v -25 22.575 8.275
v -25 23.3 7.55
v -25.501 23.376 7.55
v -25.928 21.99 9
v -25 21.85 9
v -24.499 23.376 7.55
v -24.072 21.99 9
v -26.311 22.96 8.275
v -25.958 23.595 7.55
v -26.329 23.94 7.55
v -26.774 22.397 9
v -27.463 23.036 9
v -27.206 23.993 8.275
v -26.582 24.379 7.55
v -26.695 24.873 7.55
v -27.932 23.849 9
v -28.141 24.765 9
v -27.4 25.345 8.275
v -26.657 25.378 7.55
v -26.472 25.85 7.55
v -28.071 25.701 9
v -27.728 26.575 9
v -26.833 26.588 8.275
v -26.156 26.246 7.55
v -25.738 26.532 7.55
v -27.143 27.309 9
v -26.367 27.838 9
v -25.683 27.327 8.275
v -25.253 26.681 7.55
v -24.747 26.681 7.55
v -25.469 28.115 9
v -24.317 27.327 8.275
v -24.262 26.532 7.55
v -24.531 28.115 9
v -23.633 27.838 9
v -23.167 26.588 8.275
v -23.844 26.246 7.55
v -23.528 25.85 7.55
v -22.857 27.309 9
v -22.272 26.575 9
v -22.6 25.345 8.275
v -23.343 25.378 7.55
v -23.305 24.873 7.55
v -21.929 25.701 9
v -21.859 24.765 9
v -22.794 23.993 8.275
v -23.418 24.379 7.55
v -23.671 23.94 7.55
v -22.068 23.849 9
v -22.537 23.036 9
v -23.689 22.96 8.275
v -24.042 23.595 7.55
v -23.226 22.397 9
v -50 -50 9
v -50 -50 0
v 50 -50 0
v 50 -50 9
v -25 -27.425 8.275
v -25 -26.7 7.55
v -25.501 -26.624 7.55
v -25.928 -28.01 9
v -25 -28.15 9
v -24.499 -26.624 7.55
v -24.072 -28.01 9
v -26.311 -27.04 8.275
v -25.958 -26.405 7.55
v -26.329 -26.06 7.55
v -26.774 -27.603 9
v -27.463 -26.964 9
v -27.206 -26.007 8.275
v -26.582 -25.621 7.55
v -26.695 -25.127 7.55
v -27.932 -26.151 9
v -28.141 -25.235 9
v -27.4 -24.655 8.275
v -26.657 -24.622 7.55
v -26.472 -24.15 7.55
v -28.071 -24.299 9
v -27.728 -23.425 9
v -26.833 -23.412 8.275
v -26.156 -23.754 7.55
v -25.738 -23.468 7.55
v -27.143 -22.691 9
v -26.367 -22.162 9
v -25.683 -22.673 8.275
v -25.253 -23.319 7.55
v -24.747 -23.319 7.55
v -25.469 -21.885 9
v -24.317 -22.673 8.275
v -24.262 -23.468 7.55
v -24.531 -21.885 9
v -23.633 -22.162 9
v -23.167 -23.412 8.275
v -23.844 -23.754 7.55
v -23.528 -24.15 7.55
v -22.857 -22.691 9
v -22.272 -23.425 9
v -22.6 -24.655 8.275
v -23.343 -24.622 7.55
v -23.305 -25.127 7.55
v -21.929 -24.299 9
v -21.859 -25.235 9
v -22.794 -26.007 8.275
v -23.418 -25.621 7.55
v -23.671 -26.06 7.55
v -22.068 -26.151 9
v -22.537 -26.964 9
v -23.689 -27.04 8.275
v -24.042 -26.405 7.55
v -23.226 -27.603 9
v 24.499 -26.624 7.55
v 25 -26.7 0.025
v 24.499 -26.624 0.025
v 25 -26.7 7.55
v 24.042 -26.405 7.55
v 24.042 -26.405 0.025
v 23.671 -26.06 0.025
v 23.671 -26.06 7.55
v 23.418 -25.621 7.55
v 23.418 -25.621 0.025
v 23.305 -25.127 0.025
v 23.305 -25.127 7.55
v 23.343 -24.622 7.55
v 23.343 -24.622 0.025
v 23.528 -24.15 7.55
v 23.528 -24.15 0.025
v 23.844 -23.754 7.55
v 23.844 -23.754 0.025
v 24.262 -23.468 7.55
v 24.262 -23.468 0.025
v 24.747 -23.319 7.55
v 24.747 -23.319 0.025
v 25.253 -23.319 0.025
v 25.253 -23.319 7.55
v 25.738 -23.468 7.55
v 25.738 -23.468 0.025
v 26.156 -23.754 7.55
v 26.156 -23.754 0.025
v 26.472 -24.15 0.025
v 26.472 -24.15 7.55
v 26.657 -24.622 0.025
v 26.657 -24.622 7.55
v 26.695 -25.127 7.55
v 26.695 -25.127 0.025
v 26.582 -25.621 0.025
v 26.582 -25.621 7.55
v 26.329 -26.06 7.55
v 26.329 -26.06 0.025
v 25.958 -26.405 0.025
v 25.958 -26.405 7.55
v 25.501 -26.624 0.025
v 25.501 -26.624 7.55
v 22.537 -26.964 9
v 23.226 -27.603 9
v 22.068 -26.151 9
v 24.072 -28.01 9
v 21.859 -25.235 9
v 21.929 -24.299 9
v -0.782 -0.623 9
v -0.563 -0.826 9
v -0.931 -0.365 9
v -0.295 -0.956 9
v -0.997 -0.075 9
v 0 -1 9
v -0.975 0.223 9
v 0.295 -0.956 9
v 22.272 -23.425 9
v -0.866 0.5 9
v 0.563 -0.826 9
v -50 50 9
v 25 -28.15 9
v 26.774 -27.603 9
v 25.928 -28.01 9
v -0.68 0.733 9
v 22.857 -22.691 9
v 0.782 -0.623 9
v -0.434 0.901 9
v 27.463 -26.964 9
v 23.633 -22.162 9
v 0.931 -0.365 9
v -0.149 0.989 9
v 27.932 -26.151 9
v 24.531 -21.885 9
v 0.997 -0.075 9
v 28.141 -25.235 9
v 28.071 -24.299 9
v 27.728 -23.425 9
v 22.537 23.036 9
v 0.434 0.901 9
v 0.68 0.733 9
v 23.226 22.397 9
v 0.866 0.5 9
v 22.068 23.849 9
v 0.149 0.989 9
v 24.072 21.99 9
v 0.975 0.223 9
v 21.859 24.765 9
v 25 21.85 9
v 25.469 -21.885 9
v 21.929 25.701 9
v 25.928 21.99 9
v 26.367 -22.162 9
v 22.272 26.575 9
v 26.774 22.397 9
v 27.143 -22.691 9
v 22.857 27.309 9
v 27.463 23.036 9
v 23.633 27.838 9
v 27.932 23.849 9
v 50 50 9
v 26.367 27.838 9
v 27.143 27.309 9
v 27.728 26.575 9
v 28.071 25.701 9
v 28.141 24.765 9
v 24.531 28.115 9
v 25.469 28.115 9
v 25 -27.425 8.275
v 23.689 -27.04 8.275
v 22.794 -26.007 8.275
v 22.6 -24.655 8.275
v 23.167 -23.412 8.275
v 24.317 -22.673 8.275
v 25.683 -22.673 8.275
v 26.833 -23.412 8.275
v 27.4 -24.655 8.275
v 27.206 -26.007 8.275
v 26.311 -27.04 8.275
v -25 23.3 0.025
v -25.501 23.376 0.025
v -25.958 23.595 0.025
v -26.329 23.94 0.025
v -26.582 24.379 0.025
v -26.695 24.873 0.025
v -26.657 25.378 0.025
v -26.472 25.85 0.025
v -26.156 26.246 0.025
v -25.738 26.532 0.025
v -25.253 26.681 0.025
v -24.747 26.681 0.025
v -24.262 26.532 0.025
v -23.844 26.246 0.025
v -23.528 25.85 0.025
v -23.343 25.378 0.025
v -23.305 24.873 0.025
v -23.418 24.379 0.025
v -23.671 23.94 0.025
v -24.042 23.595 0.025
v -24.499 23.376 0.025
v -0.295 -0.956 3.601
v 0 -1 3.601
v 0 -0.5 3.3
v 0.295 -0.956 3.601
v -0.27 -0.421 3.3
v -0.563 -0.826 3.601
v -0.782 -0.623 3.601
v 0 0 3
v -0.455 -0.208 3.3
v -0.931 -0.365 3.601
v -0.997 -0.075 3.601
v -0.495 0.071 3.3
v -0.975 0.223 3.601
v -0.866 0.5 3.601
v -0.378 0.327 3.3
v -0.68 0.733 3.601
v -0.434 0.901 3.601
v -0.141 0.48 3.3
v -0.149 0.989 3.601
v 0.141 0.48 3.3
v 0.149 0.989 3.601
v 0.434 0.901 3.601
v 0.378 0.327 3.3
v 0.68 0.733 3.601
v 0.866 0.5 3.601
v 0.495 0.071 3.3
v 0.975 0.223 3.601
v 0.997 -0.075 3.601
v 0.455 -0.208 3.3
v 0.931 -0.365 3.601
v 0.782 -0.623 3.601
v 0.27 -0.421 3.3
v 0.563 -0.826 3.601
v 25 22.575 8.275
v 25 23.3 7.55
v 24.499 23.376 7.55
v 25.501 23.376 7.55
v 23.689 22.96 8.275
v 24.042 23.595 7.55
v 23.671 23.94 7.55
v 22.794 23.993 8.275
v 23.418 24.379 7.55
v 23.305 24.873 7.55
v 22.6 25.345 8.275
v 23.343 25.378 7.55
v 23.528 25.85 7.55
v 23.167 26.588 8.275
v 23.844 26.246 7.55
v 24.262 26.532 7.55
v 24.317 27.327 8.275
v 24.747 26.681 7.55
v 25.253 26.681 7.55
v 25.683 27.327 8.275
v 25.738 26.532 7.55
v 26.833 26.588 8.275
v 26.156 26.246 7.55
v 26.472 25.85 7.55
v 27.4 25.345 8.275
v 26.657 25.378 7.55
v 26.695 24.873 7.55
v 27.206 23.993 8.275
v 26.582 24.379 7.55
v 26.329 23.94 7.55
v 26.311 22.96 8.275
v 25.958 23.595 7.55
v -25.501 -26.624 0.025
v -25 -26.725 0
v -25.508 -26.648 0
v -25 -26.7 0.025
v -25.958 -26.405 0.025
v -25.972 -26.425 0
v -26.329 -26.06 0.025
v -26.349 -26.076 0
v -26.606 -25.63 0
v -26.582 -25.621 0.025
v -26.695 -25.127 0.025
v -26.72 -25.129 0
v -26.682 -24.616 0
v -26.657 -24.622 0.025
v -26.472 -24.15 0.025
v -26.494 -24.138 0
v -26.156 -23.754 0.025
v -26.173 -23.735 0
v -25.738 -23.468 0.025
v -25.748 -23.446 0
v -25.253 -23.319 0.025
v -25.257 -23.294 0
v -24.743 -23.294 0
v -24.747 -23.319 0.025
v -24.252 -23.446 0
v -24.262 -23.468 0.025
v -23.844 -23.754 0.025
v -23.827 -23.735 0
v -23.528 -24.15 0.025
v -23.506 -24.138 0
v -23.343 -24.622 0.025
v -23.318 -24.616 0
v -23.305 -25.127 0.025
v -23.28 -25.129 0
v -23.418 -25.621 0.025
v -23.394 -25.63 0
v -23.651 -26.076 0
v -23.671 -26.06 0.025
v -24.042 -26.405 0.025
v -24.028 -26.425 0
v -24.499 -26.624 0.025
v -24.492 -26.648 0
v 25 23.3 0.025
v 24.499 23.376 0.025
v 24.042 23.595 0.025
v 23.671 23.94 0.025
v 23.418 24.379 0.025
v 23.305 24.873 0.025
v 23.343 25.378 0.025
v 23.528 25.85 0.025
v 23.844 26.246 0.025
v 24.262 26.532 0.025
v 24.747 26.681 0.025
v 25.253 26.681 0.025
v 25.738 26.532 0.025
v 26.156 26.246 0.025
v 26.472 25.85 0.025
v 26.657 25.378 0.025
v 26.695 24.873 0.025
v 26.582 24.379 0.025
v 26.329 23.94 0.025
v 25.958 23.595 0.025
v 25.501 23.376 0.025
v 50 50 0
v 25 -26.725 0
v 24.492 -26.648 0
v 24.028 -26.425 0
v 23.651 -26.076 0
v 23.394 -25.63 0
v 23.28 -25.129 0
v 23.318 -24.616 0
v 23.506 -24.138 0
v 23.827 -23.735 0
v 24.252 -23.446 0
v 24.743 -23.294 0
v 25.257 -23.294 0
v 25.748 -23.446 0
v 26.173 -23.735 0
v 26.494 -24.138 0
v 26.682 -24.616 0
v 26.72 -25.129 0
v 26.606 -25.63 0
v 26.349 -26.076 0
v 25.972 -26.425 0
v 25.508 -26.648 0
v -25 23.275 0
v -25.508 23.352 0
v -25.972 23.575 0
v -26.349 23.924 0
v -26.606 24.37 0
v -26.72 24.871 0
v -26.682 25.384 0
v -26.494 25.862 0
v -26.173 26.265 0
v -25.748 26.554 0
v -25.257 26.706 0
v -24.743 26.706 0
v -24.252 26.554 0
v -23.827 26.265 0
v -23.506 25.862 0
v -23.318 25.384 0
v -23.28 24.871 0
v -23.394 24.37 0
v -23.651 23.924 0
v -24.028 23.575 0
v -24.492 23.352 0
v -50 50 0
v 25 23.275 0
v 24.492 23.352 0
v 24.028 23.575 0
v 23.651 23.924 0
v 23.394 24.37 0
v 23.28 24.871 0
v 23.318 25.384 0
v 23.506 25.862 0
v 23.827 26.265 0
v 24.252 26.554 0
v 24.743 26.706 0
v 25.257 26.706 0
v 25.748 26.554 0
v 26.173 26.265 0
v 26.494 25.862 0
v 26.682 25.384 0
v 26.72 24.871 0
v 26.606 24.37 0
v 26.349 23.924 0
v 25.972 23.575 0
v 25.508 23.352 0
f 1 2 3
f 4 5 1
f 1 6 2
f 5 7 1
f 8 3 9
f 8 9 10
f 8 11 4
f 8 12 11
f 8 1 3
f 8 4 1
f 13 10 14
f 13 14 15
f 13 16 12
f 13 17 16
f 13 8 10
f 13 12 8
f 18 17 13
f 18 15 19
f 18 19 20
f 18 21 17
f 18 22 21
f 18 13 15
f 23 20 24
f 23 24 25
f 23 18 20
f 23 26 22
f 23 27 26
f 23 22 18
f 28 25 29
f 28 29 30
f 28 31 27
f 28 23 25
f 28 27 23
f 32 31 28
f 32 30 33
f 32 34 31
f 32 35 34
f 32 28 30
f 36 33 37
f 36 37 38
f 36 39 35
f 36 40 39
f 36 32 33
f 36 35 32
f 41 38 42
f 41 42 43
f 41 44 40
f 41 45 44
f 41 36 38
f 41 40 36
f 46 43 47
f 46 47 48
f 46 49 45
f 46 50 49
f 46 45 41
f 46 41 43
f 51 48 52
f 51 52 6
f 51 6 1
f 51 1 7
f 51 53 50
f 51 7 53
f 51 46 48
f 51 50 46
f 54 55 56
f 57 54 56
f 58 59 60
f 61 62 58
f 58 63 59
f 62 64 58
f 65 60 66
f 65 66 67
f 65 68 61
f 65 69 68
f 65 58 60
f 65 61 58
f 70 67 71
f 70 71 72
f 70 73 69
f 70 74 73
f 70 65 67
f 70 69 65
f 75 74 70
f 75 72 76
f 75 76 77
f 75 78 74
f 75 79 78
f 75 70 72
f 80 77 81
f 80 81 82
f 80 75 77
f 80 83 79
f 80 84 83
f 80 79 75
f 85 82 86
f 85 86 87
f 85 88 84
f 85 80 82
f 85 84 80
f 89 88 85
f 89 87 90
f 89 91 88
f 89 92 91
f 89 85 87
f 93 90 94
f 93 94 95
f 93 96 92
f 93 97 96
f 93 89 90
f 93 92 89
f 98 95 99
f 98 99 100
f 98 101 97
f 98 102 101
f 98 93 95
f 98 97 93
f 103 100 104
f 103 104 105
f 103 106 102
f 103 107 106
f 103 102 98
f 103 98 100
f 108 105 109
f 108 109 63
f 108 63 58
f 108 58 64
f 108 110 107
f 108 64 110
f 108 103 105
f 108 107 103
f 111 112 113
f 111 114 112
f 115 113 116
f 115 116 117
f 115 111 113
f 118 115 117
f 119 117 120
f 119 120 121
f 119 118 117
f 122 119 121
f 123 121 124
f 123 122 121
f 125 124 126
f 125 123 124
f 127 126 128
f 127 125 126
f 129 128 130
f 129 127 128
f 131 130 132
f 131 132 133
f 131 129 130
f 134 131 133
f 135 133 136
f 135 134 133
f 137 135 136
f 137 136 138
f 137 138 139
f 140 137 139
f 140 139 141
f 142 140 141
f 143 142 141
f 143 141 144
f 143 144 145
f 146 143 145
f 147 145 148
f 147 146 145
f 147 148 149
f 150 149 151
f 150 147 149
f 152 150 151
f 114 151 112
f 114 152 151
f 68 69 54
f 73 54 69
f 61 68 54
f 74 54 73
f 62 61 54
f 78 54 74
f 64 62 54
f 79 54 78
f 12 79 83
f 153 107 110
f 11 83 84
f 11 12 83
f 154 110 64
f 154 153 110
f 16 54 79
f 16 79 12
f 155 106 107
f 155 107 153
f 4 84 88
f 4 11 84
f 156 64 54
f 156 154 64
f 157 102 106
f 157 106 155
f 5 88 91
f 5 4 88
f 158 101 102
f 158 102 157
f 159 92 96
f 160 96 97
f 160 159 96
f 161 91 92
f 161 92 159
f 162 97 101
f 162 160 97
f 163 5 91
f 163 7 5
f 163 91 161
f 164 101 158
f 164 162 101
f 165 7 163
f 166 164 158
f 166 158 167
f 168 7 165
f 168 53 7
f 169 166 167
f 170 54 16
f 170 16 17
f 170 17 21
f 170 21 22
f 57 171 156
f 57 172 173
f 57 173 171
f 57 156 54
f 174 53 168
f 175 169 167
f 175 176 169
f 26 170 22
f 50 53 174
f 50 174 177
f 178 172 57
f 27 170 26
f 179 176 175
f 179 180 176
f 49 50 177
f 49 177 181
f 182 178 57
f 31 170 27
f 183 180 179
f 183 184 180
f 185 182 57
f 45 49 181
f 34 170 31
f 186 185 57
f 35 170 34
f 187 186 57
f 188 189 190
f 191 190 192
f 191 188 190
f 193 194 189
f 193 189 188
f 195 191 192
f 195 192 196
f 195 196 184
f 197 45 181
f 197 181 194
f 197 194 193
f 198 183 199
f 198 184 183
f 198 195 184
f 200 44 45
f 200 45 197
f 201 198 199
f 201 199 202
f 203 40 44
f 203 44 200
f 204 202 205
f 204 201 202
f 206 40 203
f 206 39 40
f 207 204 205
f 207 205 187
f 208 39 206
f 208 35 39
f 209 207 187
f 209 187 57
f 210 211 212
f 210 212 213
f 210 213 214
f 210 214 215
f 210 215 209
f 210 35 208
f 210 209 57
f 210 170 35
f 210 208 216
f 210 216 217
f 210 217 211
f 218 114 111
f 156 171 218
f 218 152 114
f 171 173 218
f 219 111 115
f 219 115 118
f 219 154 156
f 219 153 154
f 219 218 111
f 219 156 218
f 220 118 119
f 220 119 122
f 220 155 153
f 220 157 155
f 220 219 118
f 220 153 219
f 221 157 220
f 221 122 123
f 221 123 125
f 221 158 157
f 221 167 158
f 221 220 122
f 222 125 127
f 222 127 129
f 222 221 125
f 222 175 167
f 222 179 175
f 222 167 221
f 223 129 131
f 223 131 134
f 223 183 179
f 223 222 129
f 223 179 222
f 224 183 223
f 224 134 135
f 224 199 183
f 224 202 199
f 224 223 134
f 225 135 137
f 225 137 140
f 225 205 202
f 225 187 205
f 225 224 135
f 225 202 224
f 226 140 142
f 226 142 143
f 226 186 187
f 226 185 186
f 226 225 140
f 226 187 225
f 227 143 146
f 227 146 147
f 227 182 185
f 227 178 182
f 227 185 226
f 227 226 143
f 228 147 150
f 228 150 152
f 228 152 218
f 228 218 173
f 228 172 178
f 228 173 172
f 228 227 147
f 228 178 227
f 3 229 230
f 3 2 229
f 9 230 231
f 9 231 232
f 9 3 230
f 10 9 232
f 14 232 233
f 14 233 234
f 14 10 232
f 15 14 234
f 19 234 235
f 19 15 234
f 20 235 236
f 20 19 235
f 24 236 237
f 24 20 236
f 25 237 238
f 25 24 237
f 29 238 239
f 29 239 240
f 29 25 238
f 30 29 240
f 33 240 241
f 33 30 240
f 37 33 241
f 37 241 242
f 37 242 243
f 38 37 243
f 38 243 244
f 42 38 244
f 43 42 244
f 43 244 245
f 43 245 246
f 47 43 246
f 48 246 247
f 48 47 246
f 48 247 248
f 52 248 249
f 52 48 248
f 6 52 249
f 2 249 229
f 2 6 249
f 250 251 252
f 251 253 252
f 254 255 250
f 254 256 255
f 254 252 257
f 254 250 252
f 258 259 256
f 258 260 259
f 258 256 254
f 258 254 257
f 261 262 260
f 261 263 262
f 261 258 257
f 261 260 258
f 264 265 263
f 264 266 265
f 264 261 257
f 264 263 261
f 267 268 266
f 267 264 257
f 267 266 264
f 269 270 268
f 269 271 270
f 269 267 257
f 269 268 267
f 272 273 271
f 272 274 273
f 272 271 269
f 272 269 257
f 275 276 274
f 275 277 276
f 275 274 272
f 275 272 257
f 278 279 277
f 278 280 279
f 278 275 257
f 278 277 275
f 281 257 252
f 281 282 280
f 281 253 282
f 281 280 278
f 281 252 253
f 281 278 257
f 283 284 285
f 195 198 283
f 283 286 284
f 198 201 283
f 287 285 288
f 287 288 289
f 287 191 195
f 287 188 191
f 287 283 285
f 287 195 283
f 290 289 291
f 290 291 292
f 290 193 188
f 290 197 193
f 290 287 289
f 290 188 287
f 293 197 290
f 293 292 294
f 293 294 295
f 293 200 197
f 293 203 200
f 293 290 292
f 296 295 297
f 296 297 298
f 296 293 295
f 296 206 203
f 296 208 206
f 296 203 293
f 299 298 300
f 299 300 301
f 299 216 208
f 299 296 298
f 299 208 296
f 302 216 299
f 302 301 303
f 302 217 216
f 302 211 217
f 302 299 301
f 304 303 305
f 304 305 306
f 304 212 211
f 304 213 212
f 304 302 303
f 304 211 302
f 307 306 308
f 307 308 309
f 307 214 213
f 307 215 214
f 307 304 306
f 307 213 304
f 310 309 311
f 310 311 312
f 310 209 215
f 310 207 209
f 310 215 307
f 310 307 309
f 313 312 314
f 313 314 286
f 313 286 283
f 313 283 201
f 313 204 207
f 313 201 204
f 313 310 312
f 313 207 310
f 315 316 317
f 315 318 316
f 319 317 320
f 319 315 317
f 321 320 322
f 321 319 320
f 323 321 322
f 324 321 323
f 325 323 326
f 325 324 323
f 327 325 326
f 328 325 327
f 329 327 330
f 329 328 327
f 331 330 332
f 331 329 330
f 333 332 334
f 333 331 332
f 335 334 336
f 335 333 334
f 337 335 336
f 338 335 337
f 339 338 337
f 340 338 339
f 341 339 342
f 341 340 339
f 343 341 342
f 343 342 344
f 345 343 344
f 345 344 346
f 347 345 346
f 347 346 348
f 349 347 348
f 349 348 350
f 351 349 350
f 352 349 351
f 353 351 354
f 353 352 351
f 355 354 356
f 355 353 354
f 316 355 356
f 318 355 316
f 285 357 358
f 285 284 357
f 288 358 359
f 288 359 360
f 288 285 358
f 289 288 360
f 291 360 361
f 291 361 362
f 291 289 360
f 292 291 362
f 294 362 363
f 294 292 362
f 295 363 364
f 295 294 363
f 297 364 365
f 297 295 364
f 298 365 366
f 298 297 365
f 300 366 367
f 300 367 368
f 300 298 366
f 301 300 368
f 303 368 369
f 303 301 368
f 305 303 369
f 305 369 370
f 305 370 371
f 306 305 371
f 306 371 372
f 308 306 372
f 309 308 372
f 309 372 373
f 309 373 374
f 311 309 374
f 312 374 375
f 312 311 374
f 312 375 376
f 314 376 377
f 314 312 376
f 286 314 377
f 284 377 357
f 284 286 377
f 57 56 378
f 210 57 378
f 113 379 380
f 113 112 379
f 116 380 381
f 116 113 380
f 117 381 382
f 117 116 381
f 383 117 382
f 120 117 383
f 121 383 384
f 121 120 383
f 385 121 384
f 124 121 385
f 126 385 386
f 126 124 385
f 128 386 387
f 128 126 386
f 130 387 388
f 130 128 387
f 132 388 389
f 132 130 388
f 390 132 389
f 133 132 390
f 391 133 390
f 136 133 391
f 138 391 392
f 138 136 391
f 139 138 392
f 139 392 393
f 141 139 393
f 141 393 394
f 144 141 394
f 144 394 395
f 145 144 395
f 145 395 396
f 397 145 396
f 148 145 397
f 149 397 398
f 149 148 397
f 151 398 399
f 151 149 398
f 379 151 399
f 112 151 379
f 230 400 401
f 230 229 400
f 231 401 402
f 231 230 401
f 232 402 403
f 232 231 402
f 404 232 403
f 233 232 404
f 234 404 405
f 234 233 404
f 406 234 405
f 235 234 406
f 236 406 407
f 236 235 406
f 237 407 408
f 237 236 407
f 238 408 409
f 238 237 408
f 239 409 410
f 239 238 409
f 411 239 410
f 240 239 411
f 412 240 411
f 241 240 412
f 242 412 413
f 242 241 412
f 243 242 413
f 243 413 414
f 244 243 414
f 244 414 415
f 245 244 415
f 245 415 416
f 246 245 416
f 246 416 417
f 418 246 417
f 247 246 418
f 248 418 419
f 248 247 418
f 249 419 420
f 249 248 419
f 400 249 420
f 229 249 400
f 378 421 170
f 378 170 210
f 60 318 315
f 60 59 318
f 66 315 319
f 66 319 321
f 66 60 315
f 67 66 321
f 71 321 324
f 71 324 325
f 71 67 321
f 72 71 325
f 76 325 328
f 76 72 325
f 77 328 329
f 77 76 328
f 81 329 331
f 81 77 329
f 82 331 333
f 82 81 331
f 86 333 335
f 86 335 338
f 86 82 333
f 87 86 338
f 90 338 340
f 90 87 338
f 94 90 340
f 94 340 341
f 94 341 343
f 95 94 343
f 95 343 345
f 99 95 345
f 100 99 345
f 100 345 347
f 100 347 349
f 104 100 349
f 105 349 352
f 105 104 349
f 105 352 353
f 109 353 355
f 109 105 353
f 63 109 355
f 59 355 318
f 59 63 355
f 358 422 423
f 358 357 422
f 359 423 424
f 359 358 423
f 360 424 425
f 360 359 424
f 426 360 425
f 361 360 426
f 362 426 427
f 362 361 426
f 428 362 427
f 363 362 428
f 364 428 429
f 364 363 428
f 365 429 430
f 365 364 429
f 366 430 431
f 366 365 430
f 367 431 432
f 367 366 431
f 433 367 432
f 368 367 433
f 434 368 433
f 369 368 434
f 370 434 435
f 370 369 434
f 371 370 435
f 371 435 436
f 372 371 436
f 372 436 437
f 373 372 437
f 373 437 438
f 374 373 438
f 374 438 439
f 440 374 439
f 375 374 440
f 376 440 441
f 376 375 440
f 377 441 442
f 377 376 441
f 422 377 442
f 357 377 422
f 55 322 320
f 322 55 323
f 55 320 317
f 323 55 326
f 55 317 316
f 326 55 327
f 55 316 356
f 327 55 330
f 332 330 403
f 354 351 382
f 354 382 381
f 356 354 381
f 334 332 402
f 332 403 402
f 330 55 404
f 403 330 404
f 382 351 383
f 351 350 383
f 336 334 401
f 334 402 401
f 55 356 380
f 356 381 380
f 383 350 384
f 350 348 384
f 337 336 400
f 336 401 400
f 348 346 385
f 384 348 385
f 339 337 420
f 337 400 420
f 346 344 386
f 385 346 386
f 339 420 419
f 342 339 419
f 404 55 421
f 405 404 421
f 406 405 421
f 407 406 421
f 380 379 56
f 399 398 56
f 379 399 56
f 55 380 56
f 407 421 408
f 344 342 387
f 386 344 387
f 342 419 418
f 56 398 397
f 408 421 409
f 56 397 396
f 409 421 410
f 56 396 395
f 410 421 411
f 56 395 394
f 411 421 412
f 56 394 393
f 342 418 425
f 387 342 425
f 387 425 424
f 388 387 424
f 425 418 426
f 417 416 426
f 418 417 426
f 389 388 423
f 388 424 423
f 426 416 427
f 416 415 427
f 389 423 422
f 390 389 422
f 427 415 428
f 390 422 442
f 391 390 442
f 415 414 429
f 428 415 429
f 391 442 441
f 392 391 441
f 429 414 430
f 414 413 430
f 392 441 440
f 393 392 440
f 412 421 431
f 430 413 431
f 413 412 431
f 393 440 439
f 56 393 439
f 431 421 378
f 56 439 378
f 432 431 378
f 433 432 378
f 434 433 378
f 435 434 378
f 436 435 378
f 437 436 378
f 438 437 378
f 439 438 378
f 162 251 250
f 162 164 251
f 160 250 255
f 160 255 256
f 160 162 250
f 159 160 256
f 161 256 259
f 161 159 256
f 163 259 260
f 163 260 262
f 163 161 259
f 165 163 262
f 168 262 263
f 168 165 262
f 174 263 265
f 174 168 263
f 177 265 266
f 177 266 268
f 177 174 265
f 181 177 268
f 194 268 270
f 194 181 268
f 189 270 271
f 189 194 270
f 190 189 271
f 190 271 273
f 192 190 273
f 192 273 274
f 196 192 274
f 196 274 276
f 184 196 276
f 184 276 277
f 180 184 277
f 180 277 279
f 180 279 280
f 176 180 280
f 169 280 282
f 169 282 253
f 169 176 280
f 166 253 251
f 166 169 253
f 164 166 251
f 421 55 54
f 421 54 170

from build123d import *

# Parameters (mm, degrees)
SKETCH_1_W                  = 100
SKETCH_1_H                  = 100
EXTRUDE_1_DEPTH             = 9
HOLE_WIZARD_M3_1_AT_2_COUNT = 2
HOLE_WIZARD_M3_1_AT_2_PITCH = 50
HOLE_WIZARD_M3_1_AT_3_COUNT = 2
HOLE_WIZARD_M3_1_AT_3_PITCH = 70.710678119
HOLE_WIZARD_M3_1_AT_4_COUNT = 2
HOLE_WIZARD_M3_1_AT_4_PITCH = 50


with BuildPart() as part:
    # 草圖1 → 填料-伸長1 (new body)
    with BuildSketch(Plane.XY):
        Rectangle(SKETCH_1_W, SKETCH_1_H)
    extrude(amount=EXTRUDE_1_DEPTH)

    # 草圖4 → M3 平頭機械螺釘的錐孔1 (revolve, cut)
    with BuildSketch(Plane(origin=(-25, 25, 9), x_dir=(0, -1, 0), z_dir=(1, 0, 0))):
        Polygon((0, 0), (0, 9), (1.725, 9), (1.7, 8.975), (1.7, 1.45), (3.15, 0), align=None)
    hole_wizard_m3_1 = revolve(axis=Axis((-25, 25, 15.35), (0, 0, -1)), mode=Mode.SUBTRACT)

    # M3 平頭機械螺釘的錐孔1 at 2: M3 平頭機械螺釘的錐孔1 ×2
    with Locations(*[(i * HOLE_WIZARD_M3_1_AT_2_PITCH, 0, 0) for i in range(1, HOLE_WIZARD_M3_1_AT_2_COUNT)]):
        add(hole_wizard_m3_1, mode=Mode.SUBTRACT)

    # M3 平頭機械螺釘的錐孔1 at 3: M3 平頭機械螺釘的錐孔1 ×2
    with Locations(*[Vector(0.7071067811865476, -0.7071067811865475, 0) * (i * HOLE_WIZARD_M3_1_AT_3_PITCH) for i in range(1, HOLE_WIZARD_M3_1_AT_3_COUNT)]):
        add(hole_wizard_m3_1, mode=Mode.SUBTRACT)

    # M3 平頭機械螺釘的錐孔1 at 4: M3 平頭機械螺釘的錐孔1 ×2
    with Locations(*[(0, -i * HOLE_WIZARD_M3_1_AT_4_PITCH, 0) for i in range(1, HOLE_WIZARD_M3_1_AT_4_COUNT)]):
        add(hole_wizard_m3_1, mode=Mode.SUBTRACT)

    # 草圖8 → Ø2.0mm 定位孔2 (revolve, cut)
    with BuildSketch(Plane(origin=(0, 0, 9), x_dir=(0, -1, 0), z_dir=(1, 0, 0))):
        Polygon((0, 0), (0, 6), (1, 5.399139381), (1, 0), align=None)
    revolve(axis=Axis((0, 0, 15.35), (0, 0, -1)), mode=Mode.SUBTRACT)


solid = part.part
